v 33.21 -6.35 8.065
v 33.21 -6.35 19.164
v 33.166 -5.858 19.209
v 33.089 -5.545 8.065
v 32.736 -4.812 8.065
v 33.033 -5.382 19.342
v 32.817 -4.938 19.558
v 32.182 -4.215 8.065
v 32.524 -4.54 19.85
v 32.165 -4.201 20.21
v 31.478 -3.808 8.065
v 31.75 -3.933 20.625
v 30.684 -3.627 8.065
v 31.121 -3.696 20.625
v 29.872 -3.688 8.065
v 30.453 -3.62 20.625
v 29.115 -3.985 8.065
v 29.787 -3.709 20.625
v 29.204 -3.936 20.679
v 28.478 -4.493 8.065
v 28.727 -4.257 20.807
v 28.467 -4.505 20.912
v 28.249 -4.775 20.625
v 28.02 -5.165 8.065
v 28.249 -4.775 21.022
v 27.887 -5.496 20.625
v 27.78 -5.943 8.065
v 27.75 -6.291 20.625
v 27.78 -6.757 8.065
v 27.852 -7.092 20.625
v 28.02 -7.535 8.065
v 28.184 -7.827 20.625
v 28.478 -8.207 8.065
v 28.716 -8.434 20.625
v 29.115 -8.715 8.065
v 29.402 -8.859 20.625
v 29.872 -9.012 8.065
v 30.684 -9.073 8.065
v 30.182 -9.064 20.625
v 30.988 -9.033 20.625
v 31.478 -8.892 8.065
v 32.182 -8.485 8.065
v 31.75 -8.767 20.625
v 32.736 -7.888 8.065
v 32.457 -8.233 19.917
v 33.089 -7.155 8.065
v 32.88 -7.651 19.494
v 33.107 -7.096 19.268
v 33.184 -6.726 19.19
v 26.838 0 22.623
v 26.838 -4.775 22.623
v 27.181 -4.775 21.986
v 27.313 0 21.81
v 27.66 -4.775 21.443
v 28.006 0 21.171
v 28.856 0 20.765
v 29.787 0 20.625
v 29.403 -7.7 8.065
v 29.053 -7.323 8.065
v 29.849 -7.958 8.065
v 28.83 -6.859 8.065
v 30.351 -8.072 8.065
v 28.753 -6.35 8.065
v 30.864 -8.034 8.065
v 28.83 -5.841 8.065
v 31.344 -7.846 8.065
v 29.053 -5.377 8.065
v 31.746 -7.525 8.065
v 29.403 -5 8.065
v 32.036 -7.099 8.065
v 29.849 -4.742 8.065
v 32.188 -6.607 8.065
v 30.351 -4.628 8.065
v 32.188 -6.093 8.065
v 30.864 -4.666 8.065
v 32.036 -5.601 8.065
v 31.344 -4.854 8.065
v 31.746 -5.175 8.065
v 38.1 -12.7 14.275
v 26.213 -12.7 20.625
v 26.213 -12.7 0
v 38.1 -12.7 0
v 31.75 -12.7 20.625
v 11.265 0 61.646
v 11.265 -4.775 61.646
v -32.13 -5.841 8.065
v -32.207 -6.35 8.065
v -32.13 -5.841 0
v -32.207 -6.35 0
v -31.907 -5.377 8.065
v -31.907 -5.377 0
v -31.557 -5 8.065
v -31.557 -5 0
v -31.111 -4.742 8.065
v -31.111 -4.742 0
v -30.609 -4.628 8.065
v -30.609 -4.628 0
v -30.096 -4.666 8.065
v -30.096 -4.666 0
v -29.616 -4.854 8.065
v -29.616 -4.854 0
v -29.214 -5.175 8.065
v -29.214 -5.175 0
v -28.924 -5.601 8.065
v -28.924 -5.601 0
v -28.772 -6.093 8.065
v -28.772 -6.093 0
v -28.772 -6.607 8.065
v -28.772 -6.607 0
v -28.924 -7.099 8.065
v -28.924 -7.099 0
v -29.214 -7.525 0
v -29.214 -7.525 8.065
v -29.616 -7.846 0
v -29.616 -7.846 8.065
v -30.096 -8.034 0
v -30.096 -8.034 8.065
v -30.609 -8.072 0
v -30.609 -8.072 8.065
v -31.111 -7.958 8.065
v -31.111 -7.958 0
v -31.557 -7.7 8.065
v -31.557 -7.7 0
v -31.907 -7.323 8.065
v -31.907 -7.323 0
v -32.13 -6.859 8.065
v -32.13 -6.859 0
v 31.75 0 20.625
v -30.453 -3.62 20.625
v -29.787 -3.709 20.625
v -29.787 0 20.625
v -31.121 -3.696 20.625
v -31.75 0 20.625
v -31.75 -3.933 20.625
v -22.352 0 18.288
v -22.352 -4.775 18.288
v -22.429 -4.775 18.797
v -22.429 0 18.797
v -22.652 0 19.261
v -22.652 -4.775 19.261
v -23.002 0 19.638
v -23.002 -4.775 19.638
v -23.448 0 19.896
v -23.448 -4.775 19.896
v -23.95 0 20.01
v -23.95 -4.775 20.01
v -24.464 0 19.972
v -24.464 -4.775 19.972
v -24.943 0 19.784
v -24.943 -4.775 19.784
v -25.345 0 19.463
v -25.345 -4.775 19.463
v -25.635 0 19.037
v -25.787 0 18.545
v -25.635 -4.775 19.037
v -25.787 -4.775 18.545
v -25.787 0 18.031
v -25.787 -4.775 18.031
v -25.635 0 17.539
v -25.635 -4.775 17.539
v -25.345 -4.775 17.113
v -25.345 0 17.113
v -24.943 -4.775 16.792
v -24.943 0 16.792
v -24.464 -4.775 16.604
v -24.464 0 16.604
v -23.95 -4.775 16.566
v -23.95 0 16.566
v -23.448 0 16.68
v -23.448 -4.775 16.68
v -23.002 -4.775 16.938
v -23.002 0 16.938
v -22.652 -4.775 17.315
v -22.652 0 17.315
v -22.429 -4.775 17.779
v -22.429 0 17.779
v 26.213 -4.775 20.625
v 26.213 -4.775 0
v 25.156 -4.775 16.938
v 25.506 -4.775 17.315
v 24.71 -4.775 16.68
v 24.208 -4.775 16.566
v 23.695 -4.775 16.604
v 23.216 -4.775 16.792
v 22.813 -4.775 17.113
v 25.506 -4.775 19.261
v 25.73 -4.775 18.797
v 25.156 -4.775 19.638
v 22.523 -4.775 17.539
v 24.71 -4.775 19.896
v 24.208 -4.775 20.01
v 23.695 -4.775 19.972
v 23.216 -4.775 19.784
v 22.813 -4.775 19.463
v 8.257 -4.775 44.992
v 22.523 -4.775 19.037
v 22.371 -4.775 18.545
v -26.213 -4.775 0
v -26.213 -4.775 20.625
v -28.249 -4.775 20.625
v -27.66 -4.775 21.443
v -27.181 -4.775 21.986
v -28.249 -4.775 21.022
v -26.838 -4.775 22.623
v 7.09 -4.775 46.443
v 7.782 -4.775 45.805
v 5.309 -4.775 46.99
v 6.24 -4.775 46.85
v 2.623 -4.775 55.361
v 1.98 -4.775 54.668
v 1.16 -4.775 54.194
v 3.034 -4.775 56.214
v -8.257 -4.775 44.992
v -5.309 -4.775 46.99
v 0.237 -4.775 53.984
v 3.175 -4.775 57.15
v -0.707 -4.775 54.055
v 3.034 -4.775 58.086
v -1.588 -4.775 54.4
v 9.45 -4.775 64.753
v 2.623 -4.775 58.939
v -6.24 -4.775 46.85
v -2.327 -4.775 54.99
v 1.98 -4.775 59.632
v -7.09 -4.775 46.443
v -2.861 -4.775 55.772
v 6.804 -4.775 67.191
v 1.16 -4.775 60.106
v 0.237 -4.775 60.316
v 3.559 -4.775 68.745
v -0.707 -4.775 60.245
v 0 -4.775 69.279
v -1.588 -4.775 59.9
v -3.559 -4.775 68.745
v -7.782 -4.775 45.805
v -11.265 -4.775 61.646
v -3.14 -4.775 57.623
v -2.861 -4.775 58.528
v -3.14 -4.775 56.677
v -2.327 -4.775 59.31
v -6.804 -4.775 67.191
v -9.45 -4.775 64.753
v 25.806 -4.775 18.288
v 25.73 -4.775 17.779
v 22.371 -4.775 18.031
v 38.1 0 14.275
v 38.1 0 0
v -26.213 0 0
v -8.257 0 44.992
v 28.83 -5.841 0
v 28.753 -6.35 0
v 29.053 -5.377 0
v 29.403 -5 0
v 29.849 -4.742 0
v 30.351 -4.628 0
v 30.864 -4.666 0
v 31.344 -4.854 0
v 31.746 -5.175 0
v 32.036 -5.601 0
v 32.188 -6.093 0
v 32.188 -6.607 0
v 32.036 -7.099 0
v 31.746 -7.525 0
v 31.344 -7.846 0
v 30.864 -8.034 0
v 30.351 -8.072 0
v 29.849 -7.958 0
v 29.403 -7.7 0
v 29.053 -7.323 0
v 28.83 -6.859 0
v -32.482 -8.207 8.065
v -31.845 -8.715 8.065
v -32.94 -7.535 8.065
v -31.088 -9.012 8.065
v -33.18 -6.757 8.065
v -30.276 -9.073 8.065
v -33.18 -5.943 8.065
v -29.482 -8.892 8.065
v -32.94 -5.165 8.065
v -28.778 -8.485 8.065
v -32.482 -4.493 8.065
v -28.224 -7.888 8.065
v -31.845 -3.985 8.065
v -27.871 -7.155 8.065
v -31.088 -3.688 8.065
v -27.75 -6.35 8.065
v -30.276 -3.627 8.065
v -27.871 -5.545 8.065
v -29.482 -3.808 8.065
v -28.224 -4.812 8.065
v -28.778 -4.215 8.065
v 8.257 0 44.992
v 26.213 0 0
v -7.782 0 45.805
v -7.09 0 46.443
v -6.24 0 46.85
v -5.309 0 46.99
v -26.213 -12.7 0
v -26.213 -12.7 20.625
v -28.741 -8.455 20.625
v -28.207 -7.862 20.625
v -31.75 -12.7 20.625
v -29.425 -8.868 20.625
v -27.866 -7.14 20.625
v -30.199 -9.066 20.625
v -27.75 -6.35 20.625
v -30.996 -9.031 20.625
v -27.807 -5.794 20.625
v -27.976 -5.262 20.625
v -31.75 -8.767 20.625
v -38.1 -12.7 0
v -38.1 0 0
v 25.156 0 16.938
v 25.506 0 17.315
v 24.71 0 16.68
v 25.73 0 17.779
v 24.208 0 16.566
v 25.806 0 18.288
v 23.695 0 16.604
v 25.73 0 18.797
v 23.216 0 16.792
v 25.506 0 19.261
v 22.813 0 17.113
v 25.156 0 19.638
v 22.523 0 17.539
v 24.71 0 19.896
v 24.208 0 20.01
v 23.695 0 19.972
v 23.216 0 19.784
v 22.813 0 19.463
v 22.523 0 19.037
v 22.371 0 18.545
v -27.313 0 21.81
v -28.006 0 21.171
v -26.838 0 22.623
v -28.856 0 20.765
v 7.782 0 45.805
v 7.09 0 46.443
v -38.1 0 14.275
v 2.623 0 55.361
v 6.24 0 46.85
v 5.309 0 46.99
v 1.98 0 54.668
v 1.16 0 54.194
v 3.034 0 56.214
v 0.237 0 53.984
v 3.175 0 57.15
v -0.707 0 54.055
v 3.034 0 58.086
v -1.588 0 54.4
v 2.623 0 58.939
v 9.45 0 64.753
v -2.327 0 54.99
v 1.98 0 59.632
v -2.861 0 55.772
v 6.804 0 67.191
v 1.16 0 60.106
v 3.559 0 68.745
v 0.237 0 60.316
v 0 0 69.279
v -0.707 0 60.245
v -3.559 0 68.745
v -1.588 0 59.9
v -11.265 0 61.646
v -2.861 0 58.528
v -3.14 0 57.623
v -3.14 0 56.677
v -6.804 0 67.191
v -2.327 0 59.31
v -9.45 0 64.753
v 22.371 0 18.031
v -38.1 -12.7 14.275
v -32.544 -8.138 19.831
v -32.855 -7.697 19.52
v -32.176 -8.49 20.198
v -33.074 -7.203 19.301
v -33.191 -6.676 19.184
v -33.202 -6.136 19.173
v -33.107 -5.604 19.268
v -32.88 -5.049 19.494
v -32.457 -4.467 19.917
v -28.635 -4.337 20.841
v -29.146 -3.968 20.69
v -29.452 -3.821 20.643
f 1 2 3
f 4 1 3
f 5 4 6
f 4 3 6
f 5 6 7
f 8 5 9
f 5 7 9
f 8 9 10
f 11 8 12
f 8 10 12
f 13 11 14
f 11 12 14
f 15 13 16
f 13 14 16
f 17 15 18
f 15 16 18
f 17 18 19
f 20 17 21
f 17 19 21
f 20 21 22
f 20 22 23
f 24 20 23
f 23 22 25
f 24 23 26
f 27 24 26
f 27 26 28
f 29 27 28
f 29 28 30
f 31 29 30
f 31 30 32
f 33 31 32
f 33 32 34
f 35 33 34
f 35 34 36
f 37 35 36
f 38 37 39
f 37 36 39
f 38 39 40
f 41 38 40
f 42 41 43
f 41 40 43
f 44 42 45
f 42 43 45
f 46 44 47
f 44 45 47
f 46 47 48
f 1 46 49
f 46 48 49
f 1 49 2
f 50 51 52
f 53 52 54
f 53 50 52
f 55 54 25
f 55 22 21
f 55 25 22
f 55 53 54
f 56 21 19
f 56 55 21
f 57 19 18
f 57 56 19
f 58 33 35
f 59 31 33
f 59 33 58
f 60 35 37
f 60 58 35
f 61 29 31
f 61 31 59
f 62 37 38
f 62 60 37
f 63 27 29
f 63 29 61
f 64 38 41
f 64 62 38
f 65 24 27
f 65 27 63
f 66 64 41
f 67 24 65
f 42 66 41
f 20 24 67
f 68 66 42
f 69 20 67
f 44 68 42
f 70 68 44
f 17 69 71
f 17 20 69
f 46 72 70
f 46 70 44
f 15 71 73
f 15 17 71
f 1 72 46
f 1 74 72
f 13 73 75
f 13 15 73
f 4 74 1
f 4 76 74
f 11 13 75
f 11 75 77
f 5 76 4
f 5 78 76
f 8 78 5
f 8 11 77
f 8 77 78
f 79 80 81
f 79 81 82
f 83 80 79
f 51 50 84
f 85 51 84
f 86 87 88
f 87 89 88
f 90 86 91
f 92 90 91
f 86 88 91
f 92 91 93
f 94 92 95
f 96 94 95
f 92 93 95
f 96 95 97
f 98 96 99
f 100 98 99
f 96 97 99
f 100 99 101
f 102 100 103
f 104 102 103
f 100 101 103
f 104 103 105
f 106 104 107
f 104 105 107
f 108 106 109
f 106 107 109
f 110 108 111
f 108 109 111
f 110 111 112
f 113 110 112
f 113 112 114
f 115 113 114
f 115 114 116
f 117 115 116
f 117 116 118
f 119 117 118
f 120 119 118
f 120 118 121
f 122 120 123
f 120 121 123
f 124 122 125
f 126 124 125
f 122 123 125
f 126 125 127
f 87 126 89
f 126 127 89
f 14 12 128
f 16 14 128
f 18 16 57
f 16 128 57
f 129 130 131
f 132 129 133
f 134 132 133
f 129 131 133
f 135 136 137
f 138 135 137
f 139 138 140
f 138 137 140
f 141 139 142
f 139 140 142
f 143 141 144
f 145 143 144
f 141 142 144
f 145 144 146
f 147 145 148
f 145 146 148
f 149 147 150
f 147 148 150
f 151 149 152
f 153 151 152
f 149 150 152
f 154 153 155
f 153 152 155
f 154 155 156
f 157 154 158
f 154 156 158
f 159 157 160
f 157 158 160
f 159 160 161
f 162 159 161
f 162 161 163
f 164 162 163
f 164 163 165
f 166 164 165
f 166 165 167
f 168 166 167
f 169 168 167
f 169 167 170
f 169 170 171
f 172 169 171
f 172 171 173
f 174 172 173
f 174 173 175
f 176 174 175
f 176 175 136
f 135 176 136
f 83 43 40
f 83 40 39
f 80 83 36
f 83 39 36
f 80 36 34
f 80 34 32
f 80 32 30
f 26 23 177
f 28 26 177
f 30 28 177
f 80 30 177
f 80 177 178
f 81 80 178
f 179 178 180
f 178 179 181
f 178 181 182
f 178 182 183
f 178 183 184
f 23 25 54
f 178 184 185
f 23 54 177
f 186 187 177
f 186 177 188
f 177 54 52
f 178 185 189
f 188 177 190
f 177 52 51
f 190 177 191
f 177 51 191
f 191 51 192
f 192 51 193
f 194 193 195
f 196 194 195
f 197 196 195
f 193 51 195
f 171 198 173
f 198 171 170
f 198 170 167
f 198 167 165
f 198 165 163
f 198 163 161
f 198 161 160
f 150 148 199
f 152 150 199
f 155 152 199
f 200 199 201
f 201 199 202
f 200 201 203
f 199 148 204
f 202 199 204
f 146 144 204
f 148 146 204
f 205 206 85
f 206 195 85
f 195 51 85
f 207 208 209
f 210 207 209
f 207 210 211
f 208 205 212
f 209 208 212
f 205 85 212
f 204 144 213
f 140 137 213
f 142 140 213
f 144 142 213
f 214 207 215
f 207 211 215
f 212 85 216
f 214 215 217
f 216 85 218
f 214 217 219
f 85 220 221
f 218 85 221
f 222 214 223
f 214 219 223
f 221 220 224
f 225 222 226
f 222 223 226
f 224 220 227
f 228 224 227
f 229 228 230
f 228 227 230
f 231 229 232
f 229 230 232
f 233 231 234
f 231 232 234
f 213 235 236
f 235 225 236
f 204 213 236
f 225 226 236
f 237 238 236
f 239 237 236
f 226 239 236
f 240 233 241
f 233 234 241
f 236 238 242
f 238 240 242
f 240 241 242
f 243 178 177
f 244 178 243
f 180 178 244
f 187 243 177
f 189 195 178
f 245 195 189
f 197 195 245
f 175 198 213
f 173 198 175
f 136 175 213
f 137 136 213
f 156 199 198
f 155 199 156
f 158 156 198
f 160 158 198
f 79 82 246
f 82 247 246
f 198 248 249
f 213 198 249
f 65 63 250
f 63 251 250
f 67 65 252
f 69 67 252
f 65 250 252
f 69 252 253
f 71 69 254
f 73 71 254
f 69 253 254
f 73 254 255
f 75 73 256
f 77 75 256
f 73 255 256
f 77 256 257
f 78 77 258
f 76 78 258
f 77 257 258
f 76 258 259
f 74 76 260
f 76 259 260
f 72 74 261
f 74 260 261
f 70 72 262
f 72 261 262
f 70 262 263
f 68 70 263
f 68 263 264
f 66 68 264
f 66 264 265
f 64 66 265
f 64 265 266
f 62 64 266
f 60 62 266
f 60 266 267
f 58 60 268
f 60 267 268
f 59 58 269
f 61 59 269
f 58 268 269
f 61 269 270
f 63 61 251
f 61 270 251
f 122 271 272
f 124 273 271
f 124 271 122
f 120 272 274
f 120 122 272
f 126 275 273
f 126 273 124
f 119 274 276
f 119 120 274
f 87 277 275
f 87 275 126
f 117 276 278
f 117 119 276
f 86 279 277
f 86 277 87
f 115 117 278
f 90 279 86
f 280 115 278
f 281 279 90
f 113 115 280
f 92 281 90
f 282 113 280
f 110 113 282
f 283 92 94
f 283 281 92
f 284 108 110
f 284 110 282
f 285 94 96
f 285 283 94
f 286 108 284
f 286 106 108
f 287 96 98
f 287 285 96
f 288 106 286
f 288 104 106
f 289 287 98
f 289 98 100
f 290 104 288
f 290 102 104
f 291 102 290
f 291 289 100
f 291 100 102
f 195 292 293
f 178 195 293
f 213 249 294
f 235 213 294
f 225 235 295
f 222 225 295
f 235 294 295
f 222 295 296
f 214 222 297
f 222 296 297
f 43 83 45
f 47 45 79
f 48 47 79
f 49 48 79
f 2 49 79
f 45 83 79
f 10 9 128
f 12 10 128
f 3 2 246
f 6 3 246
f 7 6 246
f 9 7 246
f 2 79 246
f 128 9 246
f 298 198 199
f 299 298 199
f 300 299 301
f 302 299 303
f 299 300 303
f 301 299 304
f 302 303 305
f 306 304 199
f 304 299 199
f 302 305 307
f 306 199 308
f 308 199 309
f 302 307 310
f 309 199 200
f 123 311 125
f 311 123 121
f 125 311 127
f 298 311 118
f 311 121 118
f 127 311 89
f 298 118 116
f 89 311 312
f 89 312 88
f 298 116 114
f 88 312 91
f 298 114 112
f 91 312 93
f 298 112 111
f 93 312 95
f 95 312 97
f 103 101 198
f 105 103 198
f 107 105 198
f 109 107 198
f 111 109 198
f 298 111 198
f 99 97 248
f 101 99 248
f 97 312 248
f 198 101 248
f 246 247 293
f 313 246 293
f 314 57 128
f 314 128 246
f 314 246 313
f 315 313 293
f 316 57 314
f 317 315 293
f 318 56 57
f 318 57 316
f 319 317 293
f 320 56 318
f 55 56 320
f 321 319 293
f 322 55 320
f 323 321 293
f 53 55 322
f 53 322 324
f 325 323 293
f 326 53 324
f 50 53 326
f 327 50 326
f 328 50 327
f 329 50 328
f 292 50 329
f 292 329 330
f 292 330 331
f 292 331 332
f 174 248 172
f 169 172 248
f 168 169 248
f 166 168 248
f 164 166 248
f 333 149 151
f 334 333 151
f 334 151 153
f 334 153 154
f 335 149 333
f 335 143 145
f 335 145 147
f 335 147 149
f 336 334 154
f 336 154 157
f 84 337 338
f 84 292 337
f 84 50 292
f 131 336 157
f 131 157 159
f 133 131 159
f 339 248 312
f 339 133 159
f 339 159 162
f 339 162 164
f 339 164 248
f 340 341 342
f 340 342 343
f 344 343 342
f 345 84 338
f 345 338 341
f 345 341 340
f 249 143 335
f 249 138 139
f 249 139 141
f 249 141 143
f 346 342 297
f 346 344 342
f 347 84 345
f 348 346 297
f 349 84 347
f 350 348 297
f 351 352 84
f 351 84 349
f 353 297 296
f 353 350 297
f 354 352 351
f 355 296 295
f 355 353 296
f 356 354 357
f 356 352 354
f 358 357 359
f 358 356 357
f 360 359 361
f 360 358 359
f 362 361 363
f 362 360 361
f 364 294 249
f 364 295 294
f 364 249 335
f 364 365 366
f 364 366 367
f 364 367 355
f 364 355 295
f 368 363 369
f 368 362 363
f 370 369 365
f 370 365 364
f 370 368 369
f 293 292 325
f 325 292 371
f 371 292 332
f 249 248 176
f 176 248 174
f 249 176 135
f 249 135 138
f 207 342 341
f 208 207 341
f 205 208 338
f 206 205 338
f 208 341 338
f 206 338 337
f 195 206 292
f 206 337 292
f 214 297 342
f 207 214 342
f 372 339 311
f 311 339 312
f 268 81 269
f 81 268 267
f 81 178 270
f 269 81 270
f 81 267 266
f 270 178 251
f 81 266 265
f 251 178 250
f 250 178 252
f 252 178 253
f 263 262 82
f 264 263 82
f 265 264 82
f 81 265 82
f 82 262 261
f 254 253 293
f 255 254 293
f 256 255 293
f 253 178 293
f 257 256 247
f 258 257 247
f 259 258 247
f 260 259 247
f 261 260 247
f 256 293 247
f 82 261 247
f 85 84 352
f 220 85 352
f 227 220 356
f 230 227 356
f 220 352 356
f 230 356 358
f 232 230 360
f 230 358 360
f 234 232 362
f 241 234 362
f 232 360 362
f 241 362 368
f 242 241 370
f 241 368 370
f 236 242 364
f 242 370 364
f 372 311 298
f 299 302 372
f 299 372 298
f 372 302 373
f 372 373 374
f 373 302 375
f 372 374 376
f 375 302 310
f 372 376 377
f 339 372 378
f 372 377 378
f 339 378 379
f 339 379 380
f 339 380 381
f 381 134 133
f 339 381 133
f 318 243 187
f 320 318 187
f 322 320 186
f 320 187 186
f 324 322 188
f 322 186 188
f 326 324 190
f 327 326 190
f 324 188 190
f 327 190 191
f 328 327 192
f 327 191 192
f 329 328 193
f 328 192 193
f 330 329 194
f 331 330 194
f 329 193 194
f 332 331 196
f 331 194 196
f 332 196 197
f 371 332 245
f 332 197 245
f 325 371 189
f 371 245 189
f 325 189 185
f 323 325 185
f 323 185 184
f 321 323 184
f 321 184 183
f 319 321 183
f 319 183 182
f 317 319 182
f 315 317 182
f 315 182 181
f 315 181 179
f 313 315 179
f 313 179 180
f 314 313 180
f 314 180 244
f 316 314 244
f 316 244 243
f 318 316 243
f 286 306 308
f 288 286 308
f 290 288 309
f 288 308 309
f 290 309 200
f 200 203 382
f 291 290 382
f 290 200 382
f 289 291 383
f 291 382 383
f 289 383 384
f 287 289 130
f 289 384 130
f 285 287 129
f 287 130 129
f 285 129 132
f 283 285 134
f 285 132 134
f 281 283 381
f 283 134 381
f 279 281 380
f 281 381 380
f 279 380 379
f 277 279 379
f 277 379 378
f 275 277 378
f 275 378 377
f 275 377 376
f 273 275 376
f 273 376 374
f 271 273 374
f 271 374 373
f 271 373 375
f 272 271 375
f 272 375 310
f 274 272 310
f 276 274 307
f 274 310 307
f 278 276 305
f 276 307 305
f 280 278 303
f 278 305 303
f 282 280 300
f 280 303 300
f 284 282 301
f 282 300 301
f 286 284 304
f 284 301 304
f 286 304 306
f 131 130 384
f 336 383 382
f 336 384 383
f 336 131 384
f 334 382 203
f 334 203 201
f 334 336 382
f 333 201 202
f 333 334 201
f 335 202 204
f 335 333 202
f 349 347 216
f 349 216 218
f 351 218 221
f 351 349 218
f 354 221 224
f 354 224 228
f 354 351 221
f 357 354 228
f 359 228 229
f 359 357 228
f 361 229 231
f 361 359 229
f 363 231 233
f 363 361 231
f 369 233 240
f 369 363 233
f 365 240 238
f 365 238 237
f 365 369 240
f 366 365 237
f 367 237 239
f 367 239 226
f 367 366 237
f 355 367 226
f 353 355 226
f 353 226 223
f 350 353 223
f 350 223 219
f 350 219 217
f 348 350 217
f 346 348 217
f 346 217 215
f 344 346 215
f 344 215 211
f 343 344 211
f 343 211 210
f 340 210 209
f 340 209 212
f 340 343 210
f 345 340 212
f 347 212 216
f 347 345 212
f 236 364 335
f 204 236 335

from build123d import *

# Parameters (mm, degrees)
F0_R           = 3.175
F1_DEPTH       = 4.7752
F3_DEPTH       = 7.9248
F4_SIZE        = 6.35
F6_D           = 3.4544
F6_START       = 1.4605
F6_CBORE_D     = 5.461
F6_CBORE_DEPTH = 11.0998
F8_D           = 3.4544
F8_DEPTH       = 5.08
F8_TIP         = 1.0378064612
F9_T4_DEPTH    = 4.7752
F9_S5_R        = 2.7305
F9_T6_DEPTH    = 4
F9_T10_DEPTH   = 4.7752
F9_S11_R       = 2.7305
F9_T12_DEPTH   = 4


# Not quite as in the source:
# - a fillet or chamfer that OpenCascade refuses, or shapes differently, is made with other operations: its cross-section is extruded or revolved along the edge and cut away or added


with BuildPart() as f1:
    # F0 (on Front) → F1 (new body)
    with BuildSketch(Plane.XZ):
        with BuildLine():
            ThreePointArc((-8.2574477487, 44.9918270709), (-7.0896388893, 46.4434074028), (-5.3086, 46.99))
            Line((-5.3086, 46.99), (5.3086, 46.99))
            ThreePointArc((5.3086, 46.99), (7.0896388893, 46.4434074028), (8.2574477487, 44.9918270709))
            Line((8.2574477487, 44.9918270709), (26.2128, 0))
            Line((26.2128, 0), (38.1, 0))
            Line((38.1, 0), (38.1, 20.6248))
            Line((38.1, 20.6248), (27.6356818802, 20.6248))
            Line((27.6356818802, 20.6248), (11.2650625427, 61.6456646408))
            ThreePointArc((11.2650625427, 61.6456646408), (0, 69.2789997383), (-11.2650625427, 61.6456646408))
            Line((-11.2650625427, 61.6456646408), (-27.6356818802, 20.6248))
            Line((-27.6356818802, 20.6248), (-38.1, 20.6248))
            Line((-38.1, 20.6248), (-38.1, 0))
            Line((-38.1, 0), (-26.2128, 0))
            Line((-26.2128, 0), (-8.2574477487, 44.9918270709))
        make_face()
        with Locations((0, 57.15)):
            Circle(F0_R, mode=Mode.SUBTRACT)
    extrude(amount=F1_DEPTH)

    # F2 (on face) → F3 (join)
    with BuildSketch(Plane.XZ.offset(4.7752)):
        Polygon((-27.6356818802, 20.6248), (-38.1, 20.6248), (-38.1, 0), (-26.2128, 0), (-26.2128, 20.6248), align=None)
        Polygon((38.1, 20.6248), (27.6356818802, 20.6248), (26.2128, 20.6248), (26.2128, 0), (38.1, 0), align=None)
    extrude(amount=F3_DEPTH)

    # F4
    f4_edges = [f1.edges().sort_by_distance(p)[0] for p in [
        (38.1, -6.35, 20.6248),
        (-38.1, -6.35, 20.6248),
    ]]
    chamfer(f4_edges, length=F4_SIZE)

    # F6 (through all)
    # its depths count from where the whole tool has entered the part; down to there all is cleared
    with Locations(Plane.XY.offset(20.6248).offset(-F6_START)):
        with Locations((-30.48, -6.35), (30.48, -6.35)):
            CounterBoreHole(F6_D / 2, F6_CBORE_D / 2, F6_CBORE_DEPTH)

    # F8
    with Locations(Plane(origin=(0, 0, 0), x_dir=(-1, 0, 0), z_dir=(0, 1, 0))):
        with Locations((-24.0792, 18.288), (24.0792, 18.288)):
            Hole(F8_D / 2, depth=F8_DEPTH)
            with Locations((0, 0, -(F8_DEPTH + F8_TIP / 2))):  # 118° drill point
                Cone(0, F8_D / 2, F8_TIP, mode=Mode.SUBTRACT)

    # F9: fillet of radius 3.175 on 2 edges, made by hand


with BuildPart() as f9_tool2:
    # F9_s3 → F9_t4 (new body)
    with BuildSketch(Plane.XZ):
        with BuildLine():
            ThreePointArc((-29.7870981589, 20.6248), (-28.0060592696, 21.1713925972), (-26.8382504101, 22.6229729291))
            Line((-26.8382504101, 22.6229729291), (-27.6356818802, 20.6248))
            Line((-27.6356818802, 20.6248), (-29.7870981589, 20.6248))
        make_face()
    extrude(amount=F9_T4_DEPTH)

    # F9_s5 → F9_t6 (cut, symmetric)
    with BuildSketch(Plane.XY.offset(21.6)):
        with Locations((-30.48, -6.35)):
            Circle(F9_S5_R)
    extrude(amount=F9_T6_DEPTH, both=True, mode=Mode.SUBTRACT)


with BuildPart() as f1_1:
    add(f1.part)

    # F9_t1: union F9_tool2
    add(f9_tool2.part)


with BuildPart() as f9_tool8:
    # F9_s9 → F9_t10 (new body)
    with BuildSketch(Plane.XZ):
        with BuildLine():
            ThreePointArc((26.8382504101, 22.6229729291), (28.0060592696, 21.1713925972), (29.7870981589, 20.6248))
            Line((29.7870981589, 20.6248), (27.6356818802, 20.6248))
            Line((27.6356818802, 20.6248), (26.8382504101, 22.6229729291))
        make_face()
    extrude(amount=F9_T10_DEPTH)

    # F9_s11 → F9_t12 (cut, symmetric)
    with BuildSketch(Plane.XY.offset(21.6)):
        with Locations((30.48, -6.35)):
            Circle(F9_S11_R)
    extrude(amount=F9_T12_DEPTH, both=True, mode=Mode.SUBTRACT)


with BuildPart() as f1_2:
    add(f1_1.part)

    # F9_t7: union F9_tool8
    add(f9_tool8.part)


solid = f1_2.part
